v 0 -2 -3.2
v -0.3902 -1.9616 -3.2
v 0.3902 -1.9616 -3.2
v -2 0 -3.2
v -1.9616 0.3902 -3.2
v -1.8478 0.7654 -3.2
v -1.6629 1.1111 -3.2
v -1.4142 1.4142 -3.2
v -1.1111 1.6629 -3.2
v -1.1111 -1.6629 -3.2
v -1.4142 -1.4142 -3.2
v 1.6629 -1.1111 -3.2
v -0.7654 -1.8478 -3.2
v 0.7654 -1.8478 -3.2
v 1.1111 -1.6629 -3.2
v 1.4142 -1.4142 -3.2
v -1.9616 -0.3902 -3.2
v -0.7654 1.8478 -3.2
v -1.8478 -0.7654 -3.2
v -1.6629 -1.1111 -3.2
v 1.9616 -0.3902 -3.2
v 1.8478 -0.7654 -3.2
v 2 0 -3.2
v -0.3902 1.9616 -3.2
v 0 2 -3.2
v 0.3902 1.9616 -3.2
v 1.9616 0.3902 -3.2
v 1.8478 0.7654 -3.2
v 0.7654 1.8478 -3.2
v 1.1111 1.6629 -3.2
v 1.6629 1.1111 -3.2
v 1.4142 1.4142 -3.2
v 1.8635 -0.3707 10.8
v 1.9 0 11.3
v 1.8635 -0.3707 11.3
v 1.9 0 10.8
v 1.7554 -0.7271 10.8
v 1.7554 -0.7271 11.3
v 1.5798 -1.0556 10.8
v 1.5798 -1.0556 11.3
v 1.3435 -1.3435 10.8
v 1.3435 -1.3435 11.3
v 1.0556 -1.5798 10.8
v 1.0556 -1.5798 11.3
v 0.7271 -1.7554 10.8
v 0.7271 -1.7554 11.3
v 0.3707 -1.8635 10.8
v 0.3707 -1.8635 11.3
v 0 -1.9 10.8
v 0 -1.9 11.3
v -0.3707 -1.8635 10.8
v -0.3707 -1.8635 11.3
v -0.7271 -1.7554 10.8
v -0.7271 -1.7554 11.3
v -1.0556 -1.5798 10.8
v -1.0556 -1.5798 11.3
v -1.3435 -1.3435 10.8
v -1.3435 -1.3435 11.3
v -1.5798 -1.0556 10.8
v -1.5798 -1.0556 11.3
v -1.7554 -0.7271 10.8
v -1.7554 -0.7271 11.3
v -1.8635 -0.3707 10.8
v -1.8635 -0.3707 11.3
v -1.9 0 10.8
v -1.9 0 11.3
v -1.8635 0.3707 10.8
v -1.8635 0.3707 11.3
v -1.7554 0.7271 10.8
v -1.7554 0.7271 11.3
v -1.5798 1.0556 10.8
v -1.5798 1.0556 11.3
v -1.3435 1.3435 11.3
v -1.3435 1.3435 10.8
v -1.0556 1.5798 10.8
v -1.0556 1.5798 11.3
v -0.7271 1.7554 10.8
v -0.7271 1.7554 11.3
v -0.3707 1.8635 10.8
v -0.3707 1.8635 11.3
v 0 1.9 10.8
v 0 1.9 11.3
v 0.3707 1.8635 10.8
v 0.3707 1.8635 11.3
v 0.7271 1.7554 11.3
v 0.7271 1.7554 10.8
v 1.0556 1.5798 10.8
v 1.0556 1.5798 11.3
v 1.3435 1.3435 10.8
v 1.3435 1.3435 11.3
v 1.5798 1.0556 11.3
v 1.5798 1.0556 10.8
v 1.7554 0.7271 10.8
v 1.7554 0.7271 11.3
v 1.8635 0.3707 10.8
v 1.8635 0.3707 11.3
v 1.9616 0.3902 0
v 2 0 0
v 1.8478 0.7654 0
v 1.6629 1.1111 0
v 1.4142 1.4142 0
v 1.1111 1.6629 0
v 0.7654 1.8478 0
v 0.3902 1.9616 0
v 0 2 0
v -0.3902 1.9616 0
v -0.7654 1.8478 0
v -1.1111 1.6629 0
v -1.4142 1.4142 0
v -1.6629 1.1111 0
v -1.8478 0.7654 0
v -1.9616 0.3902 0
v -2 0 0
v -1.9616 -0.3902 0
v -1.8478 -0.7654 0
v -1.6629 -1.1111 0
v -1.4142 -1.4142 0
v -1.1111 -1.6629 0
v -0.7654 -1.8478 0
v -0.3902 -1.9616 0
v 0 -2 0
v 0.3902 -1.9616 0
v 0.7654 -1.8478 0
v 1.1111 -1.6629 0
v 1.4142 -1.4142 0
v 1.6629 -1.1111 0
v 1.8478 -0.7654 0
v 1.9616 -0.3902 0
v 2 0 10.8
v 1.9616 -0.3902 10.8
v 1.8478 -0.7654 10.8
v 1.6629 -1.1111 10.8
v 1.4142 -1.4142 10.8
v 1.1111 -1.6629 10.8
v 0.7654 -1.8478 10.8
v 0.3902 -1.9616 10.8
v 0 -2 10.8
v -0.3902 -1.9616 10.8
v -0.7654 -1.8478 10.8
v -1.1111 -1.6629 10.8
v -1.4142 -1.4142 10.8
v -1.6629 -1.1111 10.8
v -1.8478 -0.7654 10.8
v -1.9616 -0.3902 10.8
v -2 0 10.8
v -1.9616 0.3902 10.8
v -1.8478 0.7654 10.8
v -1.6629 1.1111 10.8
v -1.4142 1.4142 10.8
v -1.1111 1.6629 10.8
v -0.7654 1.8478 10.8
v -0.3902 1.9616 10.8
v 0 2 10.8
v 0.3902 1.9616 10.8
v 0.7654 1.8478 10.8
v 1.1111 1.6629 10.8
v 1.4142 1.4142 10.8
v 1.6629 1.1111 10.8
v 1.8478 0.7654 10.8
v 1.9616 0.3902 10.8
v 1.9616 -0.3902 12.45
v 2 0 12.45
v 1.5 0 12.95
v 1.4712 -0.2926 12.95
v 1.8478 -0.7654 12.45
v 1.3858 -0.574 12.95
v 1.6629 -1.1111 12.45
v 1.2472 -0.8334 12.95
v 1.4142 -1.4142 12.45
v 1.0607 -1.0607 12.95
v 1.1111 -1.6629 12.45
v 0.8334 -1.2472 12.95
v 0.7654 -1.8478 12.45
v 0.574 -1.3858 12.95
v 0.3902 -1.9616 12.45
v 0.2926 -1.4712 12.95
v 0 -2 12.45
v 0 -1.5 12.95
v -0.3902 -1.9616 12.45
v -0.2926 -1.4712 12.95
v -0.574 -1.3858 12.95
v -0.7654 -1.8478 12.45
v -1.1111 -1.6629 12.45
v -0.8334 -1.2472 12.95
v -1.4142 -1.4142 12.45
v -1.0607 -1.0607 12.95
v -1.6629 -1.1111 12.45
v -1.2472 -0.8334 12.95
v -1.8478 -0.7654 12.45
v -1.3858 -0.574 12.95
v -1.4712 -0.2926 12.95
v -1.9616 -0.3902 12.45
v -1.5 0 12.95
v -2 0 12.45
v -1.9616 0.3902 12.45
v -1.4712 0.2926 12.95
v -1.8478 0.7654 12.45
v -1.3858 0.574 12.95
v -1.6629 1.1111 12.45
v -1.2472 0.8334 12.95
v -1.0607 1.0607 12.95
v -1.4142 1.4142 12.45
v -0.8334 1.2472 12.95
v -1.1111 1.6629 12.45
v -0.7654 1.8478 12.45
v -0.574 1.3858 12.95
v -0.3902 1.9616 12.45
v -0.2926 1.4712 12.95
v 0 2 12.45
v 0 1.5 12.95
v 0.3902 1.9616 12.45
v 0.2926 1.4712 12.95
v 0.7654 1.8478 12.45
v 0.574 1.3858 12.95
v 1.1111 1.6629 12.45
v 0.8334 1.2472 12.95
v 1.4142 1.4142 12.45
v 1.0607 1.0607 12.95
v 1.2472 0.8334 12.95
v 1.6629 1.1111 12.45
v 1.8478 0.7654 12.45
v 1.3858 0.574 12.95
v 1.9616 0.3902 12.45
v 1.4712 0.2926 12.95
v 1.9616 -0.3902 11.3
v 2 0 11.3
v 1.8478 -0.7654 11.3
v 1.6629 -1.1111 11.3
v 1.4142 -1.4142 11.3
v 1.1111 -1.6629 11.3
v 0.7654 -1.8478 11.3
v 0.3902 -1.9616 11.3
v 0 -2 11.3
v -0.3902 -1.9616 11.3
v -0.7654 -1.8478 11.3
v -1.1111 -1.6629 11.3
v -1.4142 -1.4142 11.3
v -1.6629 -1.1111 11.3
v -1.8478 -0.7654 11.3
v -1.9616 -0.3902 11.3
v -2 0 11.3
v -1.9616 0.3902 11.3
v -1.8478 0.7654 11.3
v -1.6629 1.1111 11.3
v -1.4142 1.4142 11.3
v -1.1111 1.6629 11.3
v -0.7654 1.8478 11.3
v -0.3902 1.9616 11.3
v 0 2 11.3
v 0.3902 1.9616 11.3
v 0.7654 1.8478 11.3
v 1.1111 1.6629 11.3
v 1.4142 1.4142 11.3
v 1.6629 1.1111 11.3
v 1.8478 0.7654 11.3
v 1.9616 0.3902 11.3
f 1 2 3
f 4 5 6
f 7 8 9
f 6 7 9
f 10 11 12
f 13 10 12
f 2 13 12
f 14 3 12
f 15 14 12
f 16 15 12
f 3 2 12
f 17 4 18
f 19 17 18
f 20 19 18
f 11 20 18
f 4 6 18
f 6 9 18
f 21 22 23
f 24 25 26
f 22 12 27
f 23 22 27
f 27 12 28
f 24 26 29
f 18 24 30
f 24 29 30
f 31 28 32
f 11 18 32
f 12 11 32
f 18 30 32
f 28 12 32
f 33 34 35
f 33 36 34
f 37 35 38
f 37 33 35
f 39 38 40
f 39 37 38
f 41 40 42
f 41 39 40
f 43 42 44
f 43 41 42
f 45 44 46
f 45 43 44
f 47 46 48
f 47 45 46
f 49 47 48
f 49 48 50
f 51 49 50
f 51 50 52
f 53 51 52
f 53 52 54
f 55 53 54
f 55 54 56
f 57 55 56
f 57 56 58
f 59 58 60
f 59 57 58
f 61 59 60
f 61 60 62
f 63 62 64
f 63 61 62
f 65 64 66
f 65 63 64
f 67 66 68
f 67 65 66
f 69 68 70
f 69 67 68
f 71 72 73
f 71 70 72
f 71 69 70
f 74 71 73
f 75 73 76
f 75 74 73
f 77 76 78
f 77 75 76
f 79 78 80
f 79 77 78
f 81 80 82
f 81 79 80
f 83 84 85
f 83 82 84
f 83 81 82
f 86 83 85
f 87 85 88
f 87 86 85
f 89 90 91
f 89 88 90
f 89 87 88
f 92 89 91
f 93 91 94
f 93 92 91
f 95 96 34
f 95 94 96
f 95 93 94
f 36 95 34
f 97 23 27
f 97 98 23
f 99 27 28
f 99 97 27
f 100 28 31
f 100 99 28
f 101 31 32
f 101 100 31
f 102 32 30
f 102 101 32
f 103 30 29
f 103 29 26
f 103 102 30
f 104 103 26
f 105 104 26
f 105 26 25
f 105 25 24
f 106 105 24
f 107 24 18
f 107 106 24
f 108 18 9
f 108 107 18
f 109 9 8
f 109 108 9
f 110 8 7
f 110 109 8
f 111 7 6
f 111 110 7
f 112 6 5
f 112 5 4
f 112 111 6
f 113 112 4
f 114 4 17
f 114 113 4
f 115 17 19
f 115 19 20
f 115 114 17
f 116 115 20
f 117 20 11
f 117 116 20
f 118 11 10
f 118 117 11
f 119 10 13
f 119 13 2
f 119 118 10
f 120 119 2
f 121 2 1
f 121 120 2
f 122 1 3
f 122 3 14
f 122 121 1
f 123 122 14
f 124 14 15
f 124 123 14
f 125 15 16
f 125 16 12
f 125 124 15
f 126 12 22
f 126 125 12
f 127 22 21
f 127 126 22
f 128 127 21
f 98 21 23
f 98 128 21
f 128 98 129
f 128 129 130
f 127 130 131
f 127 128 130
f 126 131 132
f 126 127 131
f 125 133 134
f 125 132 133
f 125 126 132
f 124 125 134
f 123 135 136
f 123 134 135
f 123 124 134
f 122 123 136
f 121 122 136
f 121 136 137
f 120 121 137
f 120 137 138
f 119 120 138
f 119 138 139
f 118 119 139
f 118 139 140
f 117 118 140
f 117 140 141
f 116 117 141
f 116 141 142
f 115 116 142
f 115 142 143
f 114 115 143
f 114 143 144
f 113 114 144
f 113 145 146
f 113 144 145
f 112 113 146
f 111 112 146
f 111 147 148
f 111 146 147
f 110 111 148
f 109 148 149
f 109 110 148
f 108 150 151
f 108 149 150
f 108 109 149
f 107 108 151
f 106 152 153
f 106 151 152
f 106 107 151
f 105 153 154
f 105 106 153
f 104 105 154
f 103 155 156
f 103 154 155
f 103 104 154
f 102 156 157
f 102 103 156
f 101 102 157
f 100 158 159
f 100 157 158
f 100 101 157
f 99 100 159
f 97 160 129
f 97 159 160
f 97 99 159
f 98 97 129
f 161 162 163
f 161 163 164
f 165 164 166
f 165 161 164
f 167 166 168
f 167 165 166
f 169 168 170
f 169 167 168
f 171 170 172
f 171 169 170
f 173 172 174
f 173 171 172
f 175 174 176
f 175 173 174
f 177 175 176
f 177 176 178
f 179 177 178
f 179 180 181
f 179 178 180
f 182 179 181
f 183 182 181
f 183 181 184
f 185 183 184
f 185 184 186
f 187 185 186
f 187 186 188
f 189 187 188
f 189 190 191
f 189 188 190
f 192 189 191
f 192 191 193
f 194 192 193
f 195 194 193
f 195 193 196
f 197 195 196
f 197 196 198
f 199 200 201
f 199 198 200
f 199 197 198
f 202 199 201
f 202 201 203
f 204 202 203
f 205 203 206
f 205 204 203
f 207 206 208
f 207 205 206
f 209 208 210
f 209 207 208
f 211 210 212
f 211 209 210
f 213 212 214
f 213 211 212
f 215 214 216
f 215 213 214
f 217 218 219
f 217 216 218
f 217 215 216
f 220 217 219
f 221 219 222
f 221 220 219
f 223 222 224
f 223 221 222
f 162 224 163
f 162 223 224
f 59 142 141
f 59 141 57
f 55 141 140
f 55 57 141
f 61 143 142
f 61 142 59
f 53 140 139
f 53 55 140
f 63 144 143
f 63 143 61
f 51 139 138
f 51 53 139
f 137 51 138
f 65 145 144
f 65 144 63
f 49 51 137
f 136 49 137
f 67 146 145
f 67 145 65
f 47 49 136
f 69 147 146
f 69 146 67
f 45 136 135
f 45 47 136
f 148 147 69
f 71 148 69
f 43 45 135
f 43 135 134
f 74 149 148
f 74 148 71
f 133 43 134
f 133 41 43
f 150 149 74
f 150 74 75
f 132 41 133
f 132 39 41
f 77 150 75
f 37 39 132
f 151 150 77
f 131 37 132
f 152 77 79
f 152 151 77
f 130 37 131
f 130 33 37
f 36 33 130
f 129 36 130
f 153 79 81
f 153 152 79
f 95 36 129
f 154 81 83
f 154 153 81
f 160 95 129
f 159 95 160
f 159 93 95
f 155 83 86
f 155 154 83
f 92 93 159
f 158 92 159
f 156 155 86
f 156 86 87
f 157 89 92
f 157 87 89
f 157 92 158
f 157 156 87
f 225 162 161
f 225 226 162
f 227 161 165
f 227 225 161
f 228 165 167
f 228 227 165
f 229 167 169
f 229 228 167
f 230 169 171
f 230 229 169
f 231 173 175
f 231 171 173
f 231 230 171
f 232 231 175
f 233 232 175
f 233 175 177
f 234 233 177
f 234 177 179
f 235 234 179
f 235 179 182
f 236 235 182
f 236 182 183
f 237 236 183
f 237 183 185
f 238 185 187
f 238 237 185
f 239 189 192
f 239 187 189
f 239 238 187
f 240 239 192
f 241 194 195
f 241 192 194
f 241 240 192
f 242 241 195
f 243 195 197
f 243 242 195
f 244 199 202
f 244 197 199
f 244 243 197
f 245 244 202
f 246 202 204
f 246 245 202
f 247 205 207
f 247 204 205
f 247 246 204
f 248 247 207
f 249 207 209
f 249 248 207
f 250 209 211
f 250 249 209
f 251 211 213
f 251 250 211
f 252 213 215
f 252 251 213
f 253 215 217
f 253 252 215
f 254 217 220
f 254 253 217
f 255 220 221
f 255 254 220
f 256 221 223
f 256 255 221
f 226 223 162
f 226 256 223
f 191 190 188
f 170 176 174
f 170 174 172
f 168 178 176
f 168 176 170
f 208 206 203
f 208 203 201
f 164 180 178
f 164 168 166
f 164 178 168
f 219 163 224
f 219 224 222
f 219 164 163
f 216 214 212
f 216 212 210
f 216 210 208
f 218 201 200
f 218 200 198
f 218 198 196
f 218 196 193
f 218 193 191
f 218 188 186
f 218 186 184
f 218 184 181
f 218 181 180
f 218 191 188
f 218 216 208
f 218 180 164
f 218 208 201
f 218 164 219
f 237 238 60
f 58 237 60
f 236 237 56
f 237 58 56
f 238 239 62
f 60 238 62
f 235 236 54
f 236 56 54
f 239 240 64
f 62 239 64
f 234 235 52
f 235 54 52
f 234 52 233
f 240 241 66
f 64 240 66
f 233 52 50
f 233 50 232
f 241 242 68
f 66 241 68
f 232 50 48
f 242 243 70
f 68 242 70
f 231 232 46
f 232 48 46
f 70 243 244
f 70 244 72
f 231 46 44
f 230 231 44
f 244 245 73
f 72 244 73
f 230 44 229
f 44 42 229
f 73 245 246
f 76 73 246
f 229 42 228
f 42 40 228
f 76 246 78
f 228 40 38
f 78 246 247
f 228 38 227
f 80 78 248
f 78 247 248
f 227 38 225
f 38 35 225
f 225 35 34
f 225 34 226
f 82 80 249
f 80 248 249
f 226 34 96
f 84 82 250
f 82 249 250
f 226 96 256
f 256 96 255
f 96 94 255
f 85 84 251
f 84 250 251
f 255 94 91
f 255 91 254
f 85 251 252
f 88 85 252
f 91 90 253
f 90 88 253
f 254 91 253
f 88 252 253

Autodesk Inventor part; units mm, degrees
ref_plane "YZ Plane" through (0, 0, 0) normal (1, 0, 0) x (0, 1, 0)
ref_plane "XZ Plane" through (0, 0, 0) normal (0, 1, 0) x (-1, 0, 0)
ref_plane "XY Plane" through (0, 0, 0) normal (0, 0, 1) x (1, 0, 0)
sketch "Sketch1" plane through (0, 0, 0) normal (0, 0, 1) x (1, 0, 0)
  circle A0 centre (0, 0) radius 2
  dimension "d0" = 4
extrude "Extrusion1" add sketch "Sketch1" along normal blind 10.8 and the other way blind 3.2
sketch "Sketch2" plane through (0, 0, 10.8) normal (0, 0, 1) x (1, 0, 0)
  circle A0 centre (0, 0) radius 1.9
  dimension "d3" = 3.8
extrude "Extrusion2" add sketch "Sketch2" along normal blind 0.5
sketch "Sketch3" plane through (0, 0, 11.3) normal (0, 0, 1) x (1, 0, 0)
  circle A0 centre (0, 0) radius 2
extrude "Extrusion3" add sketch "Sketch3" along normal blind 1.65
chamfer "Chamfer1" distance 0.5 angle 45 1 edges at (-2, 0, 12.95)
properties part number "KURBELZAPFEN NEW" material "Steel ASTM A36"
